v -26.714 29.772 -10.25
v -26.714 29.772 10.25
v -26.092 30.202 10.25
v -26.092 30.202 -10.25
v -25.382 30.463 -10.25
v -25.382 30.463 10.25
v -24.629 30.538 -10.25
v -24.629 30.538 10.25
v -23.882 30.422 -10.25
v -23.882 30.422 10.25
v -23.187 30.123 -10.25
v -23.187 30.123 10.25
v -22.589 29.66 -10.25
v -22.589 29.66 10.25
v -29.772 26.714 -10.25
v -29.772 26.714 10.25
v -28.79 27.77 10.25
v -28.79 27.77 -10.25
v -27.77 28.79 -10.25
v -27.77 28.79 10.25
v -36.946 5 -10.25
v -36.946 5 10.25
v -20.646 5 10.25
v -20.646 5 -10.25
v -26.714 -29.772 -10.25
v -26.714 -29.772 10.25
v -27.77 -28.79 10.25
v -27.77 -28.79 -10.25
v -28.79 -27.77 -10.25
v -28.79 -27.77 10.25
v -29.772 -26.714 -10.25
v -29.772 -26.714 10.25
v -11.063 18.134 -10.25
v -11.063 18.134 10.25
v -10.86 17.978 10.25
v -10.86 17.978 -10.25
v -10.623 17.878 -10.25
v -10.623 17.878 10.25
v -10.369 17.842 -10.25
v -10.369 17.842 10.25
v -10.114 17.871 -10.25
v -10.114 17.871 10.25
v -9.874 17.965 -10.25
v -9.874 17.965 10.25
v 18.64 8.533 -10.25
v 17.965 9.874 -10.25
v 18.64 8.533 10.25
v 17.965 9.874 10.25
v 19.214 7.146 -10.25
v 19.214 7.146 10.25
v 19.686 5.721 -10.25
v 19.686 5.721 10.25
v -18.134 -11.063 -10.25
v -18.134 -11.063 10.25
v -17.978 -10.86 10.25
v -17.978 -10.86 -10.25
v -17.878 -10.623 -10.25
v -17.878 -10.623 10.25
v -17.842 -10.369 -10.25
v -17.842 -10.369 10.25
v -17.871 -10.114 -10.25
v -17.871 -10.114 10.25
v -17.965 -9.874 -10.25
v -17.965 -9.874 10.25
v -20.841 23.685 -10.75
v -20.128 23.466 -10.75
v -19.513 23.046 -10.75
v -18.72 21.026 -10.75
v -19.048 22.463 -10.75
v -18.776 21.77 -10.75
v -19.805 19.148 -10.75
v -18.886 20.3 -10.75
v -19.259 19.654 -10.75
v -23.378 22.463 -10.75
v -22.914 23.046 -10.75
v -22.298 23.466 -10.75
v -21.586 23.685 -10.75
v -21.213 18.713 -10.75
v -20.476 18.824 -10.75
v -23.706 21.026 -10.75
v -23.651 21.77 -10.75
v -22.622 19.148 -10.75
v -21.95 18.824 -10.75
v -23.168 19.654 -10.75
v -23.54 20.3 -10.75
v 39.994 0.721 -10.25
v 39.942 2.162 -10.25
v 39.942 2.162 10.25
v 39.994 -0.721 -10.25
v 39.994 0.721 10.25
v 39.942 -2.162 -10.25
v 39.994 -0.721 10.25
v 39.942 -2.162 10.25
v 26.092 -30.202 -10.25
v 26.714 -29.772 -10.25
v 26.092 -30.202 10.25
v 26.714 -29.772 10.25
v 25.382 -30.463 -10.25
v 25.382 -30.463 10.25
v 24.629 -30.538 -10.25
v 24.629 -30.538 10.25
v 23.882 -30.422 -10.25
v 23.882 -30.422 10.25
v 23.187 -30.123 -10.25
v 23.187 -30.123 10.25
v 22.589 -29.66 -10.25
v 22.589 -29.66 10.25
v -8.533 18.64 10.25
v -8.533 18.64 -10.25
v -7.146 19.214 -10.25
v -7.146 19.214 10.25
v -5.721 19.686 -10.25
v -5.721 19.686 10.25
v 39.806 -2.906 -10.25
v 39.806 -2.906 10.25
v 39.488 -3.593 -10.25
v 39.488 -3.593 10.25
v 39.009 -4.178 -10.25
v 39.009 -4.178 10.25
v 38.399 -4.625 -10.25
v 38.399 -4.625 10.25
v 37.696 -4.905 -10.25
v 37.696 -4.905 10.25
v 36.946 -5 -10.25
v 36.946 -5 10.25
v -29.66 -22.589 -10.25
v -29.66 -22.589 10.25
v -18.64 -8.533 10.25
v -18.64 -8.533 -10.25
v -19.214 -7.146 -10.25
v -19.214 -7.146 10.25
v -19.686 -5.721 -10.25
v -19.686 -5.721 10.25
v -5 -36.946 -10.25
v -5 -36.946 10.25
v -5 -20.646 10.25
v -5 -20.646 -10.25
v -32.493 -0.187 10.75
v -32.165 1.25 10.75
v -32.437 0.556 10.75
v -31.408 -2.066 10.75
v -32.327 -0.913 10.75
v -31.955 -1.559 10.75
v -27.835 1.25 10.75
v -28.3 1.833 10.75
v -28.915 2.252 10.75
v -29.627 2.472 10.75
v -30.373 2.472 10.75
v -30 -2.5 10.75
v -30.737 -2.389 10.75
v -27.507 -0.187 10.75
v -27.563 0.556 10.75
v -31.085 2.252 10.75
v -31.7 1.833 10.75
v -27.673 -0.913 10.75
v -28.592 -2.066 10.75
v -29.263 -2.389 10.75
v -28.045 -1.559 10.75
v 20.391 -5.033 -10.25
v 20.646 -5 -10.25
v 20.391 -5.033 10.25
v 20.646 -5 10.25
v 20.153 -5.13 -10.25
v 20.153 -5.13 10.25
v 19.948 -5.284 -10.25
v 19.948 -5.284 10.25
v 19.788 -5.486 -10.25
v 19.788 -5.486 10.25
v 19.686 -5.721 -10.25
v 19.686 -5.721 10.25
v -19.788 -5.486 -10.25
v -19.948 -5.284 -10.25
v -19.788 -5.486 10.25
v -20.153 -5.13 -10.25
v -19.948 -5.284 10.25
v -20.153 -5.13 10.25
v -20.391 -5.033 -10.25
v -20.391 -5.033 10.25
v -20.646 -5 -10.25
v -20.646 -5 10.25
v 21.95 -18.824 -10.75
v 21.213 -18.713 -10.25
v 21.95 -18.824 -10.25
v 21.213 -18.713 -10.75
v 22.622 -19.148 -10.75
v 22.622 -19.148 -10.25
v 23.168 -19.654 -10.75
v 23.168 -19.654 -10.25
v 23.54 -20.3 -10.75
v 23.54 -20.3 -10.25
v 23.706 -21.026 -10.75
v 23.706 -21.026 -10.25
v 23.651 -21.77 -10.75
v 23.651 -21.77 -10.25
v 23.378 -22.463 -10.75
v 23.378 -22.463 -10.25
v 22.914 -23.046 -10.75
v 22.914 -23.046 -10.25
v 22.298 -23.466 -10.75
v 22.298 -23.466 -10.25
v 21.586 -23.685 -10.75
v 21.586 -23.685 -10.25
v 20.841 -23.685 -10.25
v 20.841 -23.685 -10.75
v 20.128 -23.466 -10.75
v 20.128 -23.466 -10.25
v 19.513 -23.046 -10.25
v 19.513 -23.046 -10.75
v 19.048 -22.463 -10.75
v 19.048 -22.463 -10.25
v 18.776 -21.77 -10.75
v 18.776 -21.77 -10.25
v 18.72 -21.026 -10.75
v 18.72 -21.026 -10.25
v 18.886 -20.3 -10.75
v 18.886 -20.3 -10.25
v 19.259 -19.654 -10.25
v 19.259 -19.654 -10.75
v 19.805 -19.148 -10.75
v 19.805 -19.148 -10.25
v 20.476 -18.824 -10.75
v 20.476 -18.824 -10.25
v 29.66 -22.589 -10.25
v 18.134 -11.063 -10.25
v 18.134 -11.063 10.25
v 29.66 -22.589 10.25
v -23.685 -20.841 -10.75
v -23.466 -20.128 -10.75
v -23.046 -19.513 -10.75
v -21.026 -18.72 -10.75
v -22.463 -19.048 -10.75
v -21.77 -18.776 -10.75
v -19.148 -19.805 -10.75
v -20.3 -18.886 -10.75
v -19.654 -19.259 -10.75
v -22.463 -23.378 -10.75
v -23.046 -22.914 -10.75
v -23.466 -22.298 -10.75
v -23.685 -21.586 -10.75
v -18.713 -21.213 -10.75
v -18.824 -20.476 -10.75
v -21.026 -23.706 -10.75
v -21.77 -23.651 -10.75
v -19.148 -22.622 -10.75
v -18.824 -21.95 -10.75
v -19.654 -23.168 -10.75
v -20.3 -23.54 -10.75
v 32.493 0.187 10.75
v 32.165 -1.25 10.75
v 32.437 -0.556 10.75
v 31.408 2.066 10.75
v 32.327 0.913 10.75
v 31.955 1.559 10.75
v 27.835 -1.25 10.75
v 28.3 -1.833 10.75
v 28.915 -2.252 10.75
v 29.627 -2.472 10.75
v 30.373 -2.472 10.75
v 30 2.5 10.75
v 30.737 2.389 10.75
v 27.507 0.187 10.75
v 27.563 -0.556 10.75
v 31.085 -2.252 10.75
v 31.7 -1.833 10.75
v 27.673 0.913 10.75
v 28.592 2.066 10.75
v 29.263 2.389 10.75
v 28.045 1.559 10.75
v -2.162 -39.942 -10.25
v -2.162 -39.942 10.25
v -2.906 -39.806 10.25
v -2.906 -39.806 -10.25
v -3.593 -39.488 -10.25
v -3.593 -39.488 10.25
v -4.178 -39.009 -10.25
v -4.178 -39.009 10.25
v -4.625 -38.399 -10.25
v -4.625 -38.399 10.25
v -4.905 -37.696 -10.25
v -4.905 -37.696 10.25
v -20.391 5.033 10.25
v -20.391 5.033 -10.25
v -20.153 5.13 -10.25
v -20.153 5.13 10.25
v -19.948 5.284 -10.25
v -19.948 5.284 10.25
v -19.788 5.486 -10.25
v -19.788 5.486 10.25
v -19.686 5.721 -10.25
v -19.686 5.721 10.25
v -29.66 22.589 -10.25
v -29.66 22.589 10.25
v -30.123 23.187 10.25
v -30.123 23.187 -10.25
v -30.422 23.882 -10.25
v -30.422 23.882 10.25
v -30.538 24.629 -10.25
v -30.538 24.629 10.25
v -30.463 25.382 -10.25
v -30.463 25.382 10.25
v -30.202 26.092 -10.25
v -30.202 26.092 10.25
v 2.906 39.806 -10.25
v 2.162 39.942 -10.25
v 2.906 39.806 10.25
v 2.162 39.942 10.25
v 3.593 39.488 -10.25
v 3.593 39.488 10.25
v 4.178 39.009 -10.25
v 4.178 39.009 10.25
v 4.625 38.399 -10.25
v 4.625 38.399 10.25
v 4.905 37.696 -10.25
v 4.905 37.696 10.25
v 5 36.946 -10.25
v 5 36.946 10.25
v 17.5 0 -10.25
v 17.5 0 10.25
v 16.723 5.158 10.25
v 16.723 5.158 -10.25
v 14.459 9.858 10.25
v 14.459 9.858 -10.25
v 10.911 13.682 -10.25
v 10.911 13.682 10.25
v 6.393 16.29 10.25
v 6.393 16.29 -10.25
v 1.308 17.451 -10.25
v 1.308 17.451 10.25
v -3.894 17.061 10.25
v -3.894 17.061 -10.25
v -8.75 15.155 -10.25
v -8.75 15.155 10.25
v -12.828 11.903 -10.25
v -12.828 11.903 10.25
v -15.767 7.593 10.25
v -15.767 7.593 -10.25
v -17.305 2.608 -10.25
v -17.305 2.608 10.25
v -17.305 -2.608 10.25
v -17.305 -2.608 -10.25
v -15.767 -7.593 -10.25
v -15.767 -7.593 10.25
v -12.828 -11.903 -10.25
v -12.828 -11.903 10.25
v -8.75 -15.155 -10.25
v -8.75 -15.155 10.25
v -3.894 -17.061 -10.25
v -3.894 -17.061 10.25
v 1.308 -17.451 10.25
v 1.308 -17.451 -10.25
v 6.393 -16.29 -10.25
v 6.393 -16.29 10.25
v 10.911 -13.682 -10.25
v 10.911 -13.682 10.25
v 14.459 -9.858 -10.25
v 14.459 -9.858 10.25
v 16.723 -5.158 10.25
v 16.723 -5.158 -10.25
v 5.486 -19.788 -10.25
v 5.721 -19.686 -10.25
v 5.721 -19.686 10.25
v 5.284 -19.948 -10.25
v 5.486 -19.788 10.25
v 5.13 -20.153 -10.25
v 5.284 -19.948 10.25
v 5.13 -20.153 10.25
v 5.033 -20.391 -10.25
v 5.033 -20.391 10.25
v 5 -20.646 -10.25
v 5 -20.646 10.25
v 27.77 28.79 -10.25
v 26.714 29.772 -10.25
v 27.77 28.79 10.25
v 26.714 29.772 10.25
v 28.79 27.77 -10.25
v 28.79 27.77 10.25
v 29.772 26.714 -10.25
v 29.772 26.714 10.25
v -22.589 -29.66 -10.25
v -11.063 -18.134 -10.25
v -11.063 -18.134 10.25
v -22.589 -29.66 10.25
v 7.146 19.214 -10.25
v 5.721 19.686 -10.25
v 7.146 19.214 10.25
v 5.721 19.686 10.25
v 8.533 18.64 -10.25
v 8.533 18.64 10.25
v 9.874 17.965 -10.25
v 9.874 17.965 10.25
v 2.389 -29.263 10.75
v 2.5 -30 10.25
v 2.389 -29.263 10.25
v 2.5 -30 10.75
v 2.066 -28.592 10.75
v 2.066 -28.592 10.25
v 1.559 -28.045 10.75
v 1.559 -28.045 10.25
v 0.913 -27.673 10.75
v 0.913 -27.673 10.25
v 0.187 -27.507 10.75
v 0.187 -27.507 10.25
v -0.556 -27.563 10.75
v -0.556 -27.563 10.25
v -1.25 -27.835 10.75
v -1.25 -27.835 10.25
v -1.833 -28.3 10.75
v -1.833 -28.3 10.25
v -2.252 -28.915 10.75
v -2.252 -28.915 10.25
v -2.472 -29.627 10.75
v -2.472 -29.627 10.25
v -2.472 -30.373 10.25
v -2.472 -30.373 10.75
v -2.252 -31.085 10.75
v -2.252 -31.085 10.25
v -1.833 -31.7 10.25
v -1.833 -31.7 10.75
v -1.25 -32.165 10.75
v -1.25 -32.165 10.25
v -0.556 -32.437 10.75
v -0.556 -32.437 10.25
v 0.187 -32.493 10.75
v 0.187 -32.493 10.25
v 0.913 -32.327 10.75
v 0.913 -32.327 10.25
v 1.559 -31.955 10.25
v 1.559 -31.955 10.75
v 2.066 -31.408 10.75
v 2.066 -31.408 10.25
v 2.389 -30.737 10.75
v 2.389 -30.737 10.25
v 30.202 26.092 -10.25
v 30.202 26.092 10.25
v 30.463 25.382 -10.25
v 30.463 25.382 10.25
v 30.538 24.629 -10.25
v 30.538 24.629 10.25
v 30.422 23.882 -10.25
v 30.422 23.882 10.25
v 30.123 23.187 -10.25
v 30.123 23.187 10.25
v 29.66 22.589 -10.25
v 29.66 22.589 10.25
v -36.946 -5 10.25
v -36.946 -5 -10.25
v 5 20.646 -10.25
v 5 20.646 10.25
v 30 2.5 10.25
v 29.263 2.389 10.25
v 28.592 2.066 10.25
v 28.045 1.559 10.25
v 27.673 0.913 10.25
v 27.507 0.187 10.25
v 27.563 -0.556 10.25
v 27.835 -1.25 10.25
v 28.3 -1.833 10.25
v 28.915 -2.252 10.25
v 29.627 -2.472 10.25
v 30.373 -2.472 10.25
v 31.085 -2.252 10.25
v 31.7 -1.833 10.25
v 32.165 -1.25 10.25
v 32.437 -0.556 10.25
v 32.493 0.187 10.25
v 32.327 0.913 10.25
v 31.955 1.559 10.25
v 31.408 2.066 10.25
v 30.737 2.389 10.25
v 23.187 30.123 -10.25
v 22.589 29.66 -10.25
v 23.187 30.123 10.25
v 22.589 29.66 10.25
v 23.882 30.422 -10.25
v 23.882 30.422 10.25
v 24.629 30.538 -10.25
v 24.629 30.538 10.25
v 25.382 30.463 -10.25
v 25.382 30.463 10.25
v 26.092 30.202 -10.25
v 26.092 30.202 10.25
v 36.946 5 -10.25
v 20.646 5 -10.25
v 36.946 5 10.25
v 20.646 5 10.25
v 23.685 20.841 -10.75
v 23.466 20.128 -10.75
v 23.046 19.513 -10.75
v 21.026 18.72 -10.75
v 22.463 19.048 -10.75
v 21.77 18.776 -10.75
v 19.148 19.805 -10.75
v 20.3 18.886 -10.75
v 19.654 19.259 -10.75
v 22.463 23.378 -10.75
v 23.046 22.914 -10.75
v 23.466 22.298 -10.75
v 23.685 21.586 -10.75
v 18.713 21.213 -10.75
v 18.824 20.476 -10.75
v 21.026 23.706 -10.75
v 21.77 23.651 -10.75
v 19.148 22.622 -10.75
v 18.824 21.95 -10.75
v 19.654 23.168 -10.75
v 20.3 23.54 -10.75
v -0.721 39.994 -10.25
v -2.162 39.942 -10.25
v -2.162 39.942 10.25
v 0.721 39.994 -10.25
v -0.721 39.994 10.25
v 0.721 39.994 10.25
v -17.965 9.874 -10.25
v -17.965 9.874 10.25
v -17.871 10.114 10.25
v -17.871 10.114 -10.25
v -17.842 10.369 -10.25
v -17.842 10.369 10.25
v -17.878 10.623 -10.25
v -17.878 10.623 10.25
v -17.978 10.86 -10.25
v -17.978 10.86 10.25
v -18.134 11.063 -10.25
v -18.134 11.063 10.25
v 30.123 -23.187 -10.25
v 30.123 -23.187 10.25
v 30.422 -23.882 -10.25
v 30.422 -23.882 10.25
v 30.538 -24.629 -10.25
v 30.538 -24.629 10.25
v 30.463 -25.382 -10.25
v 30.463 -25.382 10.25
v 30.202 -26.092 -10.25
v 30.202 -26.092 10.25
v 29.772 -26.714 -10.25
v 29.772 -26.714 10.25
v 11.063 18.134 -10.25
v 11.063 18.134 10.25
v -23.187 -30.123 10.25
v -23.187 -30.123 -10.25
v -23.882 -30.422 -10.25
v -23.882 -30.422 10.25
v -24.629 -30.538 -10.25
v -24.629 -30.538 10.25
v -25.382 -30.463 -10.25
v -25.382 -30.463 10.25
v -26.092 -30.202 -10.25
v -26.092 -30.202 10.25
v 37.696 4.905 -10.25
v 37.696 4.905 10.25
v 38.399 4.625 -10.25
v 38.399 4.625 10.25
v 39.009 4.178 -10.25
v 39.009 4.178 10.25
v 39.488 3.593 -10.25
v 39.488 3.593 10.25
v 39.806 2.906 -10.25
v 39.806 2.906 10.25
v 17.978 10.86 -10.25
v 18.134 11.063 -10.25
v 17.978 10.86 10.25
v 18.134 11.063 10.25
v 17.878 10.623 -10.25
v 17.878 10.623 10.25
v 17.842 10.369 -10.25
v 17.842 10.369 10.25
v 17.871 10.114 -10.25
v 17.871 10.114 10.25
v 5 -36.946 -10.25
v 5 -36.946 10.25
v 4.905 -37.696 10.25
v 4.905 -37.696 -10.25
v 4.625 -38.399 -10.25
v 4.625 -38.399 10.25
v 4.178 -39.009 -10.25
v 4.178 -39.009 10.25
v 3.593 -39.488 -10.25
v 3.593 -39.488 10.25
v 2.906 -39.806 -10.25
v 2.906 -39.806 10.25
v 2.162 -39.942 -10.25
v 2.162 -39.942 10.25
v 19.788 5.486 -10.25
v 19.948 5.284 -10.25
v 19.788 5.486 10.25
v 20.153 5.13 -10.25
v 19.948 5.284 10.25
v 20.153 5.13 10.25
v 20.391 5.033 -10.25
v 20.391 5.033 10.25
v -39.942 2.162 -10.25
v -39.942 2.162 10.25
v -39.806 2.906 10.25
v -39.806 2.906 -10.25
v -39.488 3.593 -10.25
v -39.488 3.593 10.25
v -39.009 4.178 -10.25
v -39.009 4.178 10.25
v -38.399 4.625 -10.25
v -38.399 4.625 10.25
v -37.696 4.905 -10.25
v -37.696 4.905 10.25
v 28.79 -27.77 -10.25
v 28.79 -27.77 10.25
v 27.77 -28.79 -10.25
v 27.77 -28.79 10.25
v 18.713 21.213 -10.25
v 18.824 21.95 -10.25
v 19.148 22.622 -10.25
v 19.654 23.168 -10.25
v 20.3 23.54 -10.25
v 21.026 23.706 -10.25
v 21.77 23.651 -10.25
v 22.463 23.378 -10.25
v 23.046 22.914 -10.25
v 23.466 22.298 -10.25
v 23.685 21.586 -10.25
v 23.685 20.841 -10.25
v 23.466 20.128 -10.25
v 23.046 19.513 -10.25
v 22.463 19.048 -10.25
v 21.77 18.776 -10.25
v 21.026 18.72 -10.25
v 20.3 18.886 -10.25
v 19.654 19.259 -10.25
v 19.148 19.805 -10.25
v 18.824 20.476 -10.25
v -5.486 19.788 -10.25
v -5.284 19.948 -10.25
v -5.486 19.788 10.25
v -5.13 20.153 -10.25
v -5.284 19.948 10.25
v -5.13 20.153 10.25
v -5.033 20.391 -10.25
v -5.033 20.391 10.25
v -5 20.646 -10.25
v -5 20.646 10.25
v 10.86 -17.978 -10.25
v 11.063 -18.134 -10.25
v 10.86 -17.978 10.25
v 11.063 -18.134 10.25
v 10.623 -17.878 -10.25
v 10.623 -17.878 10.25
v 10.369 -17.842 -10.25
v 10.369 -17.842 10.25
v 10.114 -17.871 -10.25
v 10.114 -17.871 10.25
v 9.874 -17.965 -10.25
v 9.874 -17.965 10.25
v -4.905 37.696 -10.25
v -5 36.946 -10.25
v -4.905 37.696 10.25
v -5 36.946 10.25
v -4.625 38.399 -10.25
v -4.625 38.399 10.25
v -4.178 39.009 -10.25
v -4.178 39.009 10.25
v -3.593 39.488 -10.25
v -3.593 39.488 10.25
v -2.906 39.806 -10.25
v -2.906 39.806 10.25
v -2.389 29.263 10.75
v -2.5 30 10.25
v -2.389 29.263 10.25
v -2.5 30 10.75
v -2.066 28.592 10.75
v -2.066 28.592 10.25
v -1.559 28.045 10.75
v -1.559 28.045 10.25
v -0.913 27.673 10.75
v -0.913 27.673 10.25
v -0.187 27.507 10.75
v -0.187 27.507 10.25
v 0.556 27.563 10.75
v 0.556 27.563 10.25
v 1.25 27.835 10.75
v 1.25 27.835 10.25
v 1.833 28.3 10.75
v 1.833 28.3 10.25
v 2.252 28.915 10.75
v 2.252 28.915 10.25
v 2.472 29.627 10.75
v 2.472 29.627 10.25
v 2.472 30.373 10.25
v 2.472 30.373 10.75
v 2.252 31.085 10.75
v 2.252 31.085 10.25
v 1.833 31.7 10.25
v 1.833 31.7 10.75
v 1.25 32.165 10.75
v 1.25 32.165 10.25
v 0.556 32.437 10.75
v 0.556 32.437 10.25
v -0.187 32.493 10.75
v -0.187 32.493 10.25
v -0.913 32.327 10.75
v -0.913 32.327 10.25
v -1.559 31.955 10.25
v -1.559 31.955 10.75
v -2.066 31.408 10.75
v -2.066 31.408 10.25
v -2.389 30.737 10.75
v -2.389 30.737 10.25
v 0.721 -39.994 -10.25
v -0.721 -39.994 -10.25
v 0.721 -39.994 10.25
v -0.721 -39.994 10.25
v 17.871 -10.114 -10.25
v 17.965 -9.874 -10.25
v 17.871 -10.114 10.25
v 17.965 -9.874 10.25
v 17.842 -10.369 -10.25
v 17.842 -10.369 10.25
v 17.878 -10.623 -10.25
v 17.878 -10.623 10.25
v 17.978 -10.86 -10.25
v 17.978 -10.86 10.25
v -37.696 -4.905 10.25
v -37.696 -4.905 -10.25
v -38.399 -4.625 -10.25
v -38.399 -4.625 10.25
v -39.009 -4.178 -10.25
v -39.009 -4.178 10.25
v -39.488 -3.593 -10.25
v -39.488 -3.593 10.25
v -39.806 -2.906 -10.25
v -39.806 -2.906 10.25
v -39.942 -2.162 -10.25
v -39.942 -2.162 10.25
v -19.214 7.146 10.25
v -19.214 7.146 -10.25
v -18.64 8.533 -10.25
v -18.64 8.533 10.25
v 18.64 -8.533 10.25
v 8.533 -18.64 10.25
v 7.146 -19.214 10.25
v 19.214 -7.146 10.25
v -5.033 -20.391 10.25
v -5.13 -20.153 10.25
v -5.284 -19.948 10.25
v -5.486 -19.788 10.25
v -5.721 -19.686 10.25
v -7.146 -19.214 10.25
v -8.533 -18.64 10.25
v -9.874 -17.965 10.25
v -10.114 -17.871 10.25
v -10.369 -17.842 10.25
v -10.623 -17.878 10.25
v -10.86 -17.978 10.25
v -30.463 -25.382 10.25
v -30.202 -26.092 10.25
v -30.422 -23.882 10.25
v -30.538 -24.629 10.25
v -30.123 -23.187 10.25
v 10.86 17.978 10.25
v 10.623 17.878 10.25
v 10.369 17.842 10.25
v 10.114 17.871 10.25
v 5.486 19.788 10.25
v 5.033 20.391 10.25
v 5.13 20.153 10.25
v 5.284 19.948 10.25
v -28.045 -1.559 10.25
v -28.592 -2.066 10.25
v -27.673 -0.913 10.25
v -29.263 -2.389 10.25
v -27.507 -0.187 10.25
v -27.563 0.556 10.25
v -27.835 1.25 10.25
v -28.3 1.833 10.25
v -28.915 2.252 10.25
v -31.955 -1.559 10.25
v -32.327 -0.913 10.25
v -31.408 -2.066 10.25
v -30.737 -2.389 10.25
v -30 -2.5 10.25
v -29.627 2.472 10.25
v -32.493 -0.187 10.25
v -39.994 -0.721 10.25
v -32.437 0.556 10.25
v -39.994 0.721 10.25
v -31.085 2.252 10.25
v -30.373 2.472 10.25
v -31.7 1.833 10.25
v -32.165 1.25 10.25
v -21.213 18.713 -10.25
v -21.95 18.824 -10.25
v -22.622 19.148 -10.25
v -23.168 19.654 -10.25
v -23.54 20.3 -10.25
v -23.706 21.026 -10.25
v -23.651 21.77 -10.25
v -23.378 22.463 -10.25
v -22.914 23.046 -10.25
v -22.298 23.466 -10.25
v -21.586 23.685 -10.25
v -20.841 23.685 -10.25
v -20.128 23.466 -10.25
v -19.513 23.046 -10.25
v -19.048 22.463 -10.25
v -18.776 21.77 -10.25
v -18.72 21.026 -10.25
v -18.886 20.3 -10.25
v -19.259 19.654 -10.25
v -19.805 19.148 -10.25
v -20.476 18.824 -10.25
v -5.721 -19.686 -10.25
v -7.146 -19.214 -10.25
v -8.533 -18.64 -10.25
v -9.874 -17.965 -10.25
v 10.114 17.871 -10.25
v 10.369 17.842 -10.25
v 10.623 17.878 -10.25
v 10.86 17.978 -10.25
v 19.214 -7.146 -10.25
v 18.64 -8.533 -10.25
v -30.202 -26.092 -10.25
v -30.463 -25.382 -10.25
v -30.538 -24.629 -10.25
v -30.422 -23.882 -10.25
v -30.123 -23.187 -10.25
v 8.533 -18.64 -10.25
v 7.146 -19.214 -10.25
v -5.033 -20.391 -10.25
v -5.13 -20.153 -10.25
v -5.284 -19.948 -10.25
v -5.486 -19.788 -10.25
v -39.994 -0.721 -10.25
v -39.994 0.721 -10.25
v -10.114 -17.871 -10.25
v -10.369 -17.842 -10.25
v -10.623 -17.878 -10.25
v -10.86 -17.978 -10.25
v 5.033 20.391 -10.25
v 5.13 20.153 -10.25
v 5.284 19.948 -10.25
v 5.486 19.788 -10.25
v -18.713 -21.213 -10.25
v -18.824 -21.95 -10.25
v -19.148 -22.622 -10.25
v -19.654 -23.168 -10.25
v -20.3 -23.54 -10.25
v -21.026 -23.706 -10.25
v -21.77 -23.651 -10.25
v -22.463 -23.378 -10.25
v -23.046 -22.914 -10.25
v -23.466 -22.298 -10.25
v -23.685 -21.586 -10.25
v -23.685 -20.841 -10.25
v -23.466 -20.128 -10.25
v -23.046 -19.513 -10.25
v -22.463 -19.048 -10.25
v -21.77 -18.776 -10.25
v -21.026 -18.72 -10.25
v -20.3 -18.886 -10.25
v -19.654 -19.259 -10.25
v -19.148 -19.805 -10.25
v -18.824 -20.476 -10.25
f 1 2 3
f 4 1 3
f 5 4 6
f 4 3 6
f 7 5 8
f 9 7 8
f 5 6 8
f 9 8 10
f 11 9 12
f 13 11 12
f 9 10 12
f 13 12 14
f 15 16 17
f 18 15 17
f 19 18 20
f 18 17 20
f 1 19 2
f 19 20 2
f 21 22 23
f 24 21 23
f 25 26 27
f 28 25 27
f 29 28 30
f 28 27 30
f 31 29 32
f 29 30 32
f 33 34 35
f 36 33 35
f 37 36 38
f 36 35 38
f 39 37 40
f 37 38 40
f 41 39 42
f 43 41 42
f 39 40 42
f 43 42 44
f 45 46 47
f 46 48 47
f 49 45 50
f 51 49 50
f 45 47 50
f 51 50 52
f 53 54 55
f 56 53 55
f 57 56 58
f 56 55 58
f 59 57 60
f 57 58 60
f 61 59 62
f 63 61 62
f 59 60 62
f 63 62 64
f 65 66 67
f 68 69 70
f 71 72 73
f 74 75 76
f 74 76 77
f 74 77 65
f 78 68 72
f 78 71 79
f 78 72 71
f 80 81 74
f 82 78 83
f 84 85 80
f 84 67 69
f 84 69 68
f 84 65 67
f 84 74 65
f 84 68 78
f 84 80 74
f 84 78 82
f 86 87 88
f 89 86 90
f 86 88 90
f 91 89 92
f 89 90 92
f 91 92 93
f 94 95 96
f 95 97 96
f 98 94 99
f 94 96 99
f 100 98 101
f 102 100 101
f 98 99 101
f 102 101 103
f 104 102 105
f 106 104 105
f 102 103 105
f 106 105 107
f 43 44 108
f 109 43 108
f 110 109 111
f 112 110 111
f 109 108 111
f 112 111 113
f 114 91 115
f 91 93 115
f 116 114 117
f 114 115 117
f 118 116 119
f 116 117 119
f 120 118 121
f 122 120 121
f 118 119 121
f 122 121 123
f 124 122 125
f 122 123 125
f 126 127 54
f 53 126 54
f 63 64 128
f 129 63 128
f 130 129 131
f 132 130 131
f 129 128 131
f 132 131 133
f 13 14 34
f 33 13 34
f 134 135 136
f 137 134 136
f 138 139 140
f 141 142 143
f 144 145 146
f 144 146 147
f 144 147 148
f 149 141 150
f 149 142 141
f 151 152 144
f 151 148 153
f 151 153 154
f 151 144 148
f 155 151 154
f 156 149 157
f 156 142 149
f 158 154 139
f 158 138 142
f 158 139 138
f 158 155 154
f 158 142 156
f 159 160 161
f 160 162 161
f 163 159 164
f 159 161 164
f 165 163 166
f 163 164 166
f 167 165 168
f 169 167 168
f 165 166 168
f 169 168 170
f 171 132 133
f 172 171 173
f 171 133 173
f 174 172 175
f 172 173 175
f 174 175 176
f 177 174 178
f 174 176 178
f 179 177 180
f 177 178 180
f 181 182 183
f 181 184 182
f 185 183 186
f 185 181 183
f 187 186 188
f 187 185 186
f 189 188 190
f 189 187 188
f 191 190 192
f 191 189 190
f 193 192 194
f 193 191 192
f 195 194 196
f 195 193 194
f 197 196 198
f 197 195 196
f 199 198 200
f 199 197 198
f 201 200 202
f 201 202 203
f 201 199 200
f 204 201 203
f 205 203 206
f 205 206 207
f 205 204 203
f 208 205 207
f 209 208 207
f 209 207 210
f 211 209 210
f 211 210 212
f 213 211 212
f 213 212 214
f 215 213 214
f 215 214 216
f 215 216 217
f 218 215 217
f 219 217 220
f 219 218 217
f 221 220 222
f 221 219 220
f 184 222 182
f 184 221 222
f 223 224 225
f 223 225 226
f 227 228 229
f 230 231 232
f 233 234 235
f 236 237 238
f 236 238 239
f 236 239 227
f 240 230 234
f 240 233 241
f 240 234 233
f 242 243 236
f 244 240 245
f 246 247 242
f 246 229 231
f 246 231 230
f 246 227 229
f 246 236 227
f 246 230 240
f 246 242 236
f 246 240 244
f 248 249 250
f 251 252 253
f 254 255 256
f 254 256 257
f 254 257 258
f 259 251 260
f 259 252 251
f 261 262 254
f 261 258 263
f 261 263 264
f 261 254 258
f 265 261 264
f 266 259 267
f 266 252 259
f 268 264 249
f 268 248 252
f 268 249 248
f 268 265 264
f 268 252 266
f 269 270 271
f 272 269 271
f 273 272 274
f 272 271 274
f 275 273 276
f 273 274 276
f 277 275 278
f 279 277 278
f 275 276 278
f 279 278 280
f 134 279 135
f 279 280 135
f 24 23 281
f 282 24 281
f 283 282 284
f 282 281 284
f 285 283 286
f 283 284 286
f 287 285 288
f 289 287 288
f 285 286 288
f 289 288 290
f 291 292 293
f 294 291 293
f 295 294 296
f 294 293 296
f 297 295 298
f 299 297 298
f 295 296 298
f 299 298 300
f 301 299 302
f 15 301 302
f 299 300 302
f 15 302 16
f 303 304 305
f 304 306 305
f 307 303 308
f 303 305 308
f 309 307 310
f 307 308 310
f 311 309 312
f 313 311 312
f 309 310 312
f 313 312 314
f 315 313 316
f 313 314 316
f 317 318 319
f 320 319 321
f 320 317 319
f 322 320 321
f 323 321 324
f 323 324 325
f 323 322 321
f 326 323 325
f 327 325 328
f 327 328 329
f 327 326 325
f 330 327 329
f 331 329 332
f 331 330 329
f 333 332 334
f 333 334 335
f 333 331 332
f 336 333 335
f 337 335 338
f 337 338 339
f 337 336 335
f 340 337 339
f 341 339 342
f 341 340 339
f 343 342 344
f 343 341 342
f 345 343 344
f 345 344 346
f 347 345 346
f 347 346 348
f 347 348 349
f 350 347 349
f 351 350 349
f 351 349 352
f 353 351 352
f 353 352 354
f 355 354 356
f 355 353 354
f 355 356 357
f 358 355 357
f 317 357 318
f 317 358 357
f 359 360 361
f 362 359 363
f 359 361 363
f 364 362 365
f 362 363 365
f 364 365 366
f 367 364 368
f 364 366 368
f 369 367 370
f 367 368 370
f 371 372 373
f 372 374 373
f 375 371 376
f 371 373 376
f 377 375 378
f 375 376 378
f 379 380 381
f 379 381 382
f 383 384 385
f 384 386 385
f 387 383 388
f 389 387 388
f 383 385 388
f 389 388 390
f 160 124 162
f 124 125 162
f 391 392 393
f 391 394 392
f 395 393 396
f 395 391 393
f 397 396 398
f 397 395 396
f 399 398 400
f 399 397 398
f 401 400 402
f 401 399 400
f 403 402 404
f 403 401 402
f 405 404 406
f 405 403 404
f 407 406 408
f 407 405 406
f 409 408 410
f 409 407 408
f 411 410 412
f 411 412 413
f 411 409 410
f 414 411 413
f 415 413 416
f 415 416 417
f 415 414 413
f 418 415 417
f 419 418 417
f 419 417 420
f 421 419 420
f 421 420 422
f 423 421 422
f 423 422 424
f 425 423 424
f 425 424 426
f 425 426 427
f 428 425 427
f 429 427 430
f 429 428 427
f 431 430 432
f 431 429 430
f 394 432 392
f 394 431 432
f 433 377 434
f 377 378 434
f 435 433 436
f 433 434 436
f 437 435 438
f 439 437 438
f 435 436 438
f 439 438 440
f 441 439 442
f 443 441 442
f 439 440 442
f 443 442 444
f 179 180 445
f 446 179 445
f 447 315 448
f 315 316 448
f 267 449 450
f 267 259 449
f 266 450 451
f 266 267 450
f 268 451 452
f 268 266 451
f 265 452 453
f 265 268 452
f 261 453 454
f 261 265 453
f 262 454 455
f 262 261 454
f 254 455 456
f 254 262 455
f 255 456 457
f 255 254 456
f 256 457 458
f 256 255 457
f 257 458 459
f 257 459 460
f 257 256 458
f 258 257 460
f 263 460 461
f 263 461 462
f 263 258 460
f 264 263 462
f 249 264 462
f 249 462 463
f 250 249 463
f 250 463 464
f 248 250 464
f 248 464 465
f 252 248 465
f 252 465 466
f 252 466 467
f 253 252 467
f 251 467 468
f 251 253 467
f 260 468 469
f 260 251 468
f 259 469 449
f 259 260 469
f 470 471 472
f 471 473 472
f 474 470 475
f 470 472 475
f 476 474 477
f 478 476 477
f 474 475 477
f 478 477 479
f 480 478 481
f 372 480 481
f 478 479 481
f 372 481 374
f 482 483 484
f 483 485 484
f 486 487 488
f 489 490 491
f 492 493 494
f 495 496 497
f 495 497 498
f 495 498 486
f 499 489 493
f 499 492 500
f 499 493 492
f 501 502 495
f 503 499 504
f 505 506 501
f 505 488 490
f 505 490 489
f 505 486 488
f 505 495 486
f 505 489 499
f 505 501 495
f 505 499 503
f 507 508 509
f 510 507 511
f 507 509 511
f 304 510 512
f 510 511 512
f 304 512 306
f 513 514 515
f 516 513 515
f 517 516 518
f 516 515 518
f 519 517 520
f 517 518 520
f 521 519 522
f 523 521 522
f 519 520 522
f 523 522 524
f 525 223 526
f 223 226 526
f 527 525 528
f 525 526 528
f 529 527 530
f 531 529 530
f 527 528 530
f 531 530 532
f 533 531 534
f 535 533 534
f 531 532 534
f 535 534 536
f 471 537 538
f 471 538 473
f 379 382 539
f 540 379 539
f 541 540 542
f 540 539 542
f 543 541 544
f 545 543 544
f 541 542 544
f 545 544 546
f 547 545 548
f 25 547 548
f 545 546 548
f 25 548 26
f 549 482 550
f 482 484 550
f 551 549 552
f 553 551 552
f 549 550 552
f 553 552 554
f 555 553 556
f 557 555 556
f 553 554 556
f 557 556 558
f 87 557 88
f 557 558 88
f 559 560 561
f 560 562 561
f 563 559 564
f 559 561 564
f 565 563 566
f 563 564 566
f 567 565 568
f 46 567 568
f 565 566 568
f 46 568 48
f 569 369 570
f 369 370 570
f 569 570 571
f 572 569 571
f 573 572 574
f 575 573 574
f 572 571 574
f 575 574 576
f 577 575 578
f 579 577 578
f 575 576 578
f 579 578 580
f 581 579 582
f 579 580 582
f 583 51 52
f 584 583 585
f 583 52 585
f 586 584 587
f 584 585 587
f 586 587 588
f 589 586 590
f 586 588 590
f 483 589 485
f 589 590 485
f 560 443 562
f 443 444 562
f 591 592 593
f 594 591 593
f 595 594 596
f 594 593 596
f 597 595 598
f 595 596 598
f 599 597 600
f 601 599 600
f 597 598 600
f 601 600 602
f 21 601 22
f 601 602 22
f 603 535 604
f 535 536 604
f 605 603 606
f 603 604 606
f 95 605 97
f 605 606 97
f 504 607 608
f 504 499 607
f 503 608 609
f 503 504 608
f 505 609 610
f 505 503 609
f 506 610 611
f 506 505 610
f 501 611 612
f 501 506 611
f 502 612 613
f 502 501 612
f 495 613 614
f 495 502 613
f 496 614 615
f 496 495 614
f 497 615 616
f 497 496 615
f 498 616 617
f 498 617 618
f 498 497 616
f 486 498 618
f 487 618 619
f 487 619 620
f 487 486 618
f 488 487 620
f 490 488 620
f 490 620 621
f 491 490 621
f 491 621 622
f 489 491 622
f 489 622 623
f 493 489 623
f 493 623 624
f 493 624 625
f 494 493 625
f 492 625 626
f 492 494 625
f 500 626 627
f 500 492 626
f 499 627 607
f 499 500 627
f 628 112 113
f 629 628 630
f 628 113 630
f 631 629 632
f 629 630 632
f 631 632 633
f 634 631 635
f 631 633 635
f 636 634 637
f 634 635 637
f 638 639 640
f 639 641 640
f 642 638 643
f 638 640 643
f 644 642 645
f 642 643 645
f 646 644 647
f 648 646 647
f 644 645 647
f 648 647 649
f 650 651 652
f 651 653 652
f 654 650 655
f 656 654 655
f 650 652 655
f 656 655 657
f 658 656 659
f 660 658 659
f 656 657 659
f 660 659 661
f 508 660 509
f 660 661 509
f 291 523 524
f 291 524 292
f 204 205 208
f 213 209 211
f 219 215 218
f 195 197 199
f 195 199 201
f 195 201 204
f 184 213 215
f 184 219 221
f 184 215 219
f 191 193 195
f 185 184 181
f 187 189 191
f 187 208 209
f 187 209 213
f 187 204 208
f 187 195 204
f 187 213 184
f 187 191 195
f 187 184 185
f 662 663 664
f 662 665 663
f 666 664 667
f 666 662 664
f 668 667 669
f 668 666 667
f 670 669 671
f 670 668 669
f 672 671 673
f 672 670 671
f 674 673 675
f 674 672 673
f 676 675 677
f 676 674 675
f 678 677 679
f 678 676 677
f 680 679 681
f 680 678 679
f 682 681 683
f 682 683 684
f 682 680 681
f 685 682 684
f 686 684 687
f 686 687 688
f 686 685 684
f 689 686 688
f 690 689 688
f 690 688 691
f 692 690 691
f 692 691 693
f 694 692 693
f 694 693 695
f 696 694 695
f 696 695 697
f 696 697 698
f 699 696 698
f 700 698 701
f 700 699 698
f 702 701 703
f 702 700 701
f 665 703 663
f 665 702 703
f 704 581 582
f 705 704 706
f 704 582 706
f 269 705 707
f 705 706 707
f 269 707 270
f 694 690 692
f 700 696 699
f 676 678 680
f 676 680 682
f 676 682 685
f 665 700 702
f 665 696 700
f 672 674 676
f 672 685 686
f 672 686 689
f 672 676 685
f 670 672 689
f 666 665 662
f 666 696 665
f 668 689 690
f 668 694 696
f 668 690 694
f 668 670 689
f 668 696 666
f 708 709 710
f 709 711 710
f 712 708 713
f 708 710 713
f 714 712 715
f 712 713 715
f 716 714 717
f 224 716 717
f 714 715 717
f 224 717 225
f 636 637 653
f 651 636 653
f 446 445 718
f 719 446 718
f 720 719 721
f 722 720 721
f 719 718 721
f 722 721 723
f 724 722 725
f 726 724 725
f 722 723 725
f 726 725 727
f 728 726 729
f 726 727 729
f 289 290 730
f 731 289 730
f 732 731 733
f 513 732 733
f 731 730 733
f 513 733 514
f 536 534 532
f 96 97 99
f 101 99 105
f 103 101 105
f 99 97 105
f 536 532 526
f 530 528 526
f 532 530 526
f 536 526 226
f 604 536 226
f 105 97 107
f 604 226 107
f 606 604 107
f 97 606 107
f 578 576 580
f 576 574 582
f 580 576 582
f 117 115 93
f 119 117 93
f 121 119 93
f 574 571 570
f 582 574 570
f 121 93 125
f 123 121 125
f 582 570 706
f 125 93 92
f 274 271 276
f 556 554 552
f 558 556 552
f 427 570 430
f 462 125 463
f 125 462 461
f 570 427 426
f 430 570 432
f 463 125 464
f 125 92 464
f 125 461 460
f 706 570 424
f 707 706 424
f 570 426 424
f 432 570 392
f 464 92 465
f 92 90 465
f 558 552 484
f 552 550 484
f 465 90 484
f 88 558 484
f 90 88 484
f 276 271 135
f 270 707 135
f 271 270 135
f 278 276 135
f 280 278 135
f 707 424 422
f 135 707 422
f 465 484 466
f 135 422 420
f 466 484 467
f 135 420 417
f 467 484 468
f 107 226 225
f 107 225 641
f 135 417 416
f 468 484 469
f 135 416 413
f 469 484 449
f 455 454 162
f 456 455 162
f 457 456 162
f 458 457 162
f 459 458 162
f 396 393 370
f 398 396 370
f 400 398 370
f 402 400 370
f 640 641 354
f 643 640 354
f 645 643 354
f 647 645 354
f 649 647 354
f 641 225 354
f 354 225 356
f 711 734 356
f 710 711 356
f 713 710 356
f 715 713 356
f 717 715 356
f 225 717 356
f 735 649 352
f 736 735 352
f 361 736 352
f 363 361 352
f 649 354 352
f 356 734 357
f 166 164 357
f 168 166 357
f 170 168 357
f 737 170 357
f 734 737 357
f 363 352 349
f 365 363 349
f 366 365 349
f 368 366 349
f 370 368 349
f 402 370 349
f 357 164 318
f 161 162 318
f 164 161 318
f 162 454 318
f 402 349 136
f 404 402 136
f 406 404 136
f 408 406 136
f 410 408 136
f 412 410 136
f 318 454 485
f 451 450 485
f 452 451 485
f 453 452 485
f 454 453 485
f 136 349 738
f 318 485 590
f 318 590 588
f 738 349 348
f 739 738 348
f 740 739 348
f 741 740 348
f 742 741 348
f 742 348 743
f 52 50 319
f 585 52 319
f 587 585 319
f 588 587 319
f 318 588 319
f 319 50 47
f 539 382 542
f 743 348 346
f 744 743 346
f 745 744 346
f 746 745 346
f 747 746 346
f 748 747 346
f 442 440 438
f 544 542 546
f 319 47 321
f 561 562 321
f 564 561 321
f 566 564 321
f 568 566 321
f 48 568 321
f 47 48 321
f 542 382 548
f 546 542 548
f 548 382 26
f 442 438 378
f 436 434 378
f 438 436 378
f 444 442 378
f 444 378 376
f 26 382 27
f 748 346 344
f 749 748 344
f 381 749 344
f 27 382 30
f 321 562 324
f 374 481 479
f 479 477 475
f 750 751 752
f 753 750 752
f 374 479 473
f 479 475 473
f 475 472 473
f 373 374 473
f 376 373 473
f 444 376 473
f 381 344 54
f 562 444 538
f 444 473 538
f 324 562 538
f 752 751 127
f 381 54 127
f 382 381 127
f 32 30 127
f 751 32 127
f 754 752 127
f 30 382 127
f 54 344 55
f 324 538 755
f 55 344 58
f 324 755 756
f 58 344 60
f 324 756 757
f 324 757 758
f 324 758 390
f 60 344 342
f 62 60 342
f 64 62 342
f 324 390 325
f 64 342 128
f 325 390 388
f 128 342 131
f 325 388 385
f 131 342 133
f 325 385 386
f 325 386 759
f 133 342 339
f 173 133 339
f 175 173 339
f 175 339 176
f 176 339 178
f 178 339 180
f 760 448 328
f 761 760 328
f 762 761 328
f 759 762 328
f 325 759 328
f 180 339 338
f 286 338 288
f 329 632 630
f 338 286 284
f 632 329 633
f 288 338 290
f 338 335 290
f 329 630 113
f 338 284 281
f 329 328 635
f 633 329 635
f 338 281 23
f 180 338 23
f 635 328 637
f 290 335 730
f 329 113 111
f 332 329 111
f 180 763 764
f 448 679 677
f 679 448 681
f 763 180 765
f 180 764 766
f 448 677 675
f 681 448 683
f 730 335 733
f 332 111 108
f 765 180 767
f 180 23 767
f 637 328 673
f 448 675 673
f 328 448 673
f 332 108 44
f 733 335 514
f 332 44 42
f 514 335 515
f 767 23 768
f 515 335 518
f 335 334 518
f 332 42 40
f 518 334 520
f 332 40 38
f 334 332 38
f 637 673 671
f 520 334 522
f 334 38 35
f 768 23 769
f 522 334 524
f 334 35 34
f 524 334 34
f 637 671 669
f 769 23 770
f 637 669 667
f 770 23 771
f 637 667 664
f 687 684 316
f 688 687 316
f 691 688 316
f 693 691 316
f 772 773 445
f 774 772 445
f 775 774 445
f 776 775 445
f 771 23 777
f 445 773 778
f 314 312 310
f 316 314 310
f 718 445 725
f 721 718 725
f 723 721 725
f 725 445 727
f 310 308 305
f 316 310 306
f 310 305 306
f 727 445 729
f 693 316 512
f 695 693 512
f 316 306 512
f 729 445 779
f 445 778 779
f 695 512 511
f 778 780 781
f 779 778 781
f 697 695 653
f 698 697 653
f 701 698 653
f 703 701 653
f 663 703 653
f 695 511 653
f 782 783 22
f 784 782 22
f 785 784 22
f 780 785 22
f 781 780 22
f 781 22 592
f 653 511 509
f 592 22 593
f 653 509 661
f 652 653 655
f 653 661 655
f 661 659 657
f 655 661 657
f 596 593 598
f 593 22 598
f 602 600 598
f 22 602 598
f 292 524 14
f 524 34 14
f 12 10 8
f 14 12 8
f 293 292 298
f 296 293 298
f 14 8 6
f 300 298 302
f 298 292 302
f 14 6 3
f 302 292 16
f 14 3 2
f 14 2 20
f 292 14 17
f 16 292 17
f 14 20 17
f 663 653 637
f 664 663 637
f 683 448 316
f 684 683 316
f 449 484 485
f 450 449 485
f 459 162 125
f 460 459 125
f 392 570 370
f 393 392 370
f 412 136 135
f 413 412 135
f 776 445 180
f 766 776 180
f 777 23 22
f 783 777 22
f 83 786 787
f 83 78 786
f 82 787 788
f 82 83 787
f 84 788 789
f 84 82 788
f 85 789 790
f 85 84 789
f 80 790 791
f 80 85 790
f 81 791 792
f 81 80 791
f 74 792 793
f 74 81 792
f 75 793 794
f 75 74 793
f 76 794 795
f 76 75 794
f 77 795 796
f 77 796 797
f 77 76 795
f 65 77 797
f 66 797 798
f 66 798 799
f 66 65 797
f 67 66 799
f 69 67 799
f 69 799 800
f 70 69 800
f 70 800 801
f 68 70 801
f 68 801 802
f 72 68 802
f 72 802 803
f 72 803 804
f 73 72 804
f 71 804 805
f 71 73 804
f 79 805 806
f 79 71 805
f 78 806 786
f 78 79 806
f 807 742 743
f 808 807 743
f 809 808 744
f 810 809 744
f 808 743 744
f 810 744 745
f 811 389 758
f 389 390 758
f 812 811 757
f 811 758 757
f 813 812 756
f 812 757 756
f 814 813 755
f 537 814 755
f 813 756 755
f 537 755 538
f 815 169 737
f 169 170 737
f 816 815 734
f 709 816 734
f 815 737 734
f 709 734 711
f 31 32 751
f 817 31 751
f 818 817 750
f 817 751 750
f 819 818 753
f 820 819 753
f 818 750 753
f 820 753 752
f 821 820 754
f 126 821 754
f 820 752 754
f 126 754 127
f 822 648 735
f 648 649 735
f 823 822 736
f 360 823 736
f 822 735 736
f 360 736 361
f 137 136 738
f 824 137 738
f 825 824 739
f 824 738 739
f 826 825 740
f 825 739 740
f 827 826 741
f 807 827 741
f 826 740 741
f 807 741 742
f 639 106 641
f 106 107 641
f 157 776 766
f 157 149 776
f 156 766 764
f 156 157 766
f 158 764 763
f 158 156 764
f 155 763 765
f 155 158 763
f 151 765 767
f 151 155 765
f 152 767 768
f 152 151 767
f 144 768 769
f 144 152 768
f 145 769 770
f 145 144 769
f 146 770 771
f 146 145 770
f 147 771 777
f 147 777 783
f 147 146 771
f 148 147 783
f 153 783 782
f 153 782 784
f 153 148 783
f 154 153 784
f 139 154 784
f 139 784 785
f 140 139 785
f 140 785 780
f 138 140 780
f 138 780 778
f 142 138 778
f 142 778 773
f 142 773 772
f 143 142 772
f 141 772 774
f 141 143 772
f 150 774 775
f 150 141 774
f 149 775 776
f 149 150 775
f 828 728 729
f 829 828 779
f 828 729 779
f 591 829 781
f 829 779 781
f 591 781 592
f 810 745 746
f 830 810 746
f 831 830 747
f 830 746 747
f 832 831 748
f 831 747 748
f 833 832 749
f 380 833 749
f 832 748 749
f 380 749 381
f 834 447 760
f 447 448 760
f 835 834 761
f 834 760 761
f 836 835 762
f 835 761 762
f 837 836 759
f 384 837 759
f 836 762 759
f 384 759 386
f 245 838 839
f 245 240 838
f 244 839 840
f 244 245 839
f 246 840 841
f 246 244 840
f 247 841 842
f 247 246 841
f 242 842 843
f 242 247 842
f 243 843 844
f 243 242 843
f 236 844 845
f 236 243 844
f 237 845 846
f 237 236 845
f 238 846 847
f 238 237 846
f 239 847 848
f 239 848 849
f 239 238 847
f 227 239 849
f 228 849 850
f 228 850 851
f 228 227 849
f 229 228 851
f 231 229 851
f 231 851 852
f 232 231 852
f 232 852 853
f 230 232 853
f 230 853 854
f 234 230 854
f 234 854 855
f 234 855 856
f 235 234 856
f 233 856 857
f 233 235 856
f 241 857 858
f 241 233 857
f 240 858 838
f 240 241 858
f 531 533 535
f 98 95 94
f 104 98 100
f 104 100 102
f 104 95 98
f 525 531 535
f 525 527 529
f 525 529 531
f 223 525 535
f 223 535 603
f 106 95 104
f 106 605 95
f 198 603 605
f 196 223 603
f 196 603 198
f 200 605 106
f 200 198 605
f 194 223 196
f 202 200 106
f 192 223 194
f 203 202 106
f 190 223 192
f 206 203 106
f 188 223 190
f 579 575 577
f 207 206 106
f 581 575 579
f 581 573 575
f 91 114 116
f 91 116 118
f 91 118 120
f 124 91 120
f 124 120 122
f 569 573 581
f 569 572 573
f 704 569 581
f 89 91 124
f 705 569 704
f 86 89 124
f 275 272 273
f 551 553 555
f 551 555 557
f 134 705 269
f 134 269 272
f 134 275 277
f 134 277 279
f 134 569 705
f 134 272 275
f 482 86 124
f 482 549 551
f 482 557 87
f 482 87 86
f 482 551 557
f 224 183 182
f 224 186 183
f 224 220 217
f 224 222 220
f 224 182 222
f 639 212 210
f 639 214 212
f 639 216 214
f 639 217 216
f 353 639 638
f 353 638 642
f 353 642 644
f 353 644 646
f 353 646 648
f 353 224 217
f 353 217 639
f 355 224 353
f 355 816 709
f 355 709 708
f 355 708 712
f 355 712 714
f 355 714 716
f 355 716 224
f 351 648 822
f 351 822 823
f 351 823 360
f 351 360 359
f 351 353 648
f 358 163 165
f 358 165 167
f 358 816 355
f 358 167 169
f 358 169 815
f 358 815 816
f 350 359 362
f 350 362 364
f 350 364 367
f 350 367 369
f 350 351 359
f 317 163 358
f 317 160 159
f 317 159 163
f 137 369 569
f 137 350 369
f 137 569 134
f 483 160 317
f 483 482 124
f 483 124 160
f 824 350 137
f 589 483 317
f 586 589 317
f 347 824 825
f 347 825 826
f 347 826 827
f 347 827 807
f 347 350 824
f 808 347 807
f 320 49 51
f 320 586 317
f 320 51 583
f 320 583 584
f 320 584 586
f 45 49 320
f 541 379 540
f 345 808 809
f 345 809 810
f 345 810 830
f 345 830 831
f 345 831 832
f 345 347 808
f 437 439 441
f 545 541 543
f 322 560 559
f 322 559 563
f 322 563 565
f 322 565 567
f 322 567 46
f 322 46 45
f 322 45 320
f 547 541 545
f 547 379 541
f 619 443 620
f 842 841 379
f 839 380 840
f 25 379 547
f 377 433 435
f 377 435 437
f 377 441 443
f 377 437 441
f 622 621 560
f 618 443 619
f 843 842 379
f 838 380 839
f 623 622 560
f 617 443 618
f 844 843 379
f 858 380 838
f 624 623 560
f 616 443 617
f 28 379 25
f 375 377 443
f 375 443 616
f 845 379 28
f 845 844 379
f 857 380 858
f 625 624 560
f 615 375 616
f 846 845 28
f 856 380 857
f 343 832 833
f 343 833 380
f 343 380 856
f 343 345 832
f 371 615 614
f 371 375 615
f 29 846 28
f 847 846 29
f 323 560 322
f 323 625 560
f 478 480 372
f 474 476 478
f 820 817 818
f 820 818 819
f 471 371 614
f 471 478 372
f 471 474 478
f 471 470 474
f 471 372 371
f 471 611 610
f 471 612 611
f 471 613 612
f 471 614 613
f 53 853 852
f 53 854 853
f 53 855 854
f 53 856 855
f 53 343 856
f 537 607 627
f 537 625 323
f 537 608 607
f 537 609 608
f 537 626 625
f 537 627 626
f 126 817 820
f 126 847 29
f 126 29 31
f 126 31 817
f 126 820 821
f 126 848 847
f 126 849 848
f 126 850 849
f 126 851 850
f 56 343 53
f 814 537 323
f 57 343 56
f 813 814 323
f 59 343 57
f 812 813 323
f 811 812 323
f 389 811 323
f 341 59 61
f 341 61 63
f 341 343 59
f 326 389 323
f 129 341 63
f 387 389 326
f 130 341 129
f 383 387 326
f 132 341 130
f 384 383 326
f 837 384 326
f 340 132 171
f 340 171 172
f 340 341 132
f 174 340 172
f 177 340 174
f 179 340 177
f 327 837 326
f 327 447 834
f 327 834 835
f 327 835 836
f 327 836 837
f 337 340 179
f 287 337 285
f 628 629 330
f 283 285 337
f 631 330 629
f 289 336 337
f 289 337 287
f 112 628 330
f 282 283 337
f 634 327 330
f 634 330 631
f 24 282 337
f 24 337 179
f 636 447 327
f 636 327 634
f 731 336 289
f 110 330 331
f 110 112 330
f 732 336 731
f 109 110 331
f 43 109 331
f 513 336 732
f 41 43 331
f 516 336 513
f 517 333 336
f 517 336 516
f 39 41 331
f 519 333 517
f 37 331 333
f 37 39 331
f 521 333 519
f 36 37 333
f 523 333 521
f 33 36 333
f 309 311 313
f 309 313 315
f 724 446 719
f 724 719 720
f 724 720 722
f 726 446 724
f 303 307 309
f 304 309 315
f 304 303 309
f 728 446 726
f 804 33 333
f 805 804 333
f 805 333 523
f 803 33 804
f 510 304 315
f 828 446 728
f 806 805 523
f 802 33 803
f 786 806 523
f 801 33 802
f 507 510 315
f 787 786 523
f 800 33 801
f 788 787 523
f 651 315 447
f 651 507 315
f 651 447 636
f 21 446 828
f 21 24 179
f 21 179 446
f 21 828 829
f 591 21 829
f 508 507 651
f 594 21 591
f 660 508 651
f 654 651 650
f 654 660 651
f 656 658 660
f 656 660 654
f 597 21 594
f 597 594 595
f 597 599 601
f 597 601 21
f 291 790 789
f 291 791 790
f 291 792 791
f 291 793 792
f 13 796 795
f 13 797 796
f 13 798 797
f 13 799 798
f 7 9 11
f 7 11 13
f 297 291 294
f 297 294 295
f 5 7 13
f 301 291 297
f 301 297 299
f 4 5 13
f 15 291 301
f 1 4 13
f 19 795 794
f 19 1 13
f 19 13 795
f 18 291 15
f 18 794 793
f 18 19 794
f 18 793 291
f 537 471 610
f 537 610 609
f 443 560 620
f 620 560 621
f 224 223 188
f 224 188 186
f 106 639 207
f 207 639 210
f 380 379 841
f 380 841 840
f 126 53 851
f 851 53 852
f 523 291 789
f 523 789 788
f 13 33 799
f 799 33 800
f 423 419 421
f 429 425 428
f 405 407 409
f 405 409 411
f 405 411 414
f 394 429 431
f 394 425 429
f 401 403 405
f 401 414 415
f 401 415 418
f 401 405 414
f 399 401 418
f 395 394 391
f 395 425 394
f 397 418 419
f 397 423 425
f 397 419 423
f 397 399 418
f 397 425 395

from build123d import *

# Parameters (mm, degrees)
SKETCH1_R           = 17.5
BOSS_EXTRUDE1_DEPTH = 10.25
SKETCH2_R           = 2.5
BOSS_EXTRUDE2_DEPTH = 0.5
SKETCH3_R           = 2.5
BOSS_EXTRUDE3_DEPTH = 0.5
CIRPATTERN1_COUNT   = 4


with BuildPart() as part:
    # Sketch1 → Boss-Extrude1 (new, symmetric)
    with BuildSketch(Plane.XY):
        with BuildLine():
            Line((-5, 20.645822822), (-5, 36.945906404))
            ThreePointArc((-5, 36.945906404), (-4.177898814, 39.00909732), (-2.162162162, 39.941520437))
            ThreePointArc((-2.162162162, 39.941520437), (0, 40), (2.162162162, 39.941520437))
            ThreePointArc((2.162162162, 39.941520437), (4.177898814, 39.00909732), (5, 36.945906404))
            Line((5, 36.945906404), (5, 20.645822822))
            ThreePointArc((5, 20.645822822), (5.200290751, 20.04543535), (5.720930233, 19.685551993))
            ThreePointArc((5.720930233, 19.685551993), (7.845010363, 18.939530416), (9.874478744, 17.965095868))
            ThreePointArc((9.874478744, 17.965095868), (10.497102414, 17.851424122), (11.063267415, 18.134335227))
            Line((11.063267415, 18.134335227), (22.589167049, 29.660234861))
            ThreePointArc((22.589167049, 29.660234861), (24.629376661, 30.537817825), (26.714040425, 29.771799478))
            ThreePointArc((26.714040425, 29.771799478), (28.284271247, 28.284271247), (29.771799478, 26.714040425))
            ThreePointArc((29.771799478, 26.714040425), (30.537817825, 24.629376661), (29.660234861, 22.589167049))
            Line((29.660234861, 22.589167049), (18.134335227, 11.063267415))
            ThreePointArc((18.134335227, 11.063267415), (17.851424122, 10.497102414), (17.965095868, 9.874478744))
            ThreePointArc((17.965095868, 9.874478744), (18.939530416, 7.845010363), (19.685551993, 5.720930233))
            ThreePointArc((19.685551993, 5.720930233), (20.04543535, 5.200290751), (20.645822822, 5))
            Line((20.645822822, 5), (36.945906404, 5))
            ThreePointArc((36.945906404, 5), (39.00909732, 4.177898814), (39.941520437, 2.162162162))
            ThreePointArc((39.941520437, 2.162162162), (40, 0), (39.941520437, -2.162162162))
            ThreePointArc((39.941520437, -2.162162162), (39.00909732, -4.177898814), (36.945906404, -5))
            Line((36.945906404, -5), (20.645822822, -5))
            ThreePointArc((20.645822822, -5), (20.04543535, -5.200290751), (19.685551993, -5.720930233))
            ThreePointArc((19.685551993, -5.720930233), (18.939530416, -7.845010363), (17.965095868, -9.874478744))
            ThreePointArc((17.965095868, -9.874478744), (17.851424122, -10.497102414), (18.134335227, -11.063267415))
            Line((18.134335227, -11.063267415), (29.660234861, -22.589167049))
            ThreePointArc((29.660234861, -22.589167049), (30.537817825, -24.629376661), (29.771799478, -26.714040425))
            ThreePointArc((29.771799478, -26.714040425), (28.284271247, -28.284271247), (26.714040425, -29.771799478))
            ThreePointArc((26.714040425, -29.771799478), (24.629376661, -30.537817825), (22.589167049, -29.660234861))
            Line((22.589167049, -29.660234861), (11.063267415, -18.134335227))
            ThreePointArc((11.063267415, -18.134335227), (10.497102414, -17.851424122), (9.874478744, -17.965095868))
            ThreePointArc((9.874478744, -17.965095868), (7.845010363, -18.939530416), (5.720930233, -19.685551993))
            ThreePointArc((5.720930233, -19.685551993), (5.200290751, -20.04543535), (5, -20.645822822))
            Line((5, -20.645822822), (5, -36.945906404))
            ThreePointArc((5, -36.945906404), (4.177898814, -39.00909732), (2.162162162, -39.941520437))
            ThreePointArc((2.162162162, -39.941520437), (0, -40), (-2.162162162, -39.941520437))
            ThreePointArc((-2.162162162, -39.941520437), (-4.177898814, -39.00909732), (-5, -36.945906404))
            Line((-5, -36.945906404), (-5, -20.645822822))
            ThreePointArc((-5, -20.645822822), (-5.200290751, -20.04543535), (-5.720930233, -19.685551993))
            ThreePointArc((-5.720930233, -19.685551993), (-7.845010363, -18.939530416), (-9.874478744, -17.965095868))
            ThreePointArc((-9.874478744, -17.965095868), (-10.497102414, -17.851424122), (-11.063267415, -18.134335227))
            Line((-11.063267415, -18.134335227), (-22.589167049, -29.660234861))
            ThreePointArc((-22.589167049, -29.660234861), (-24.629376661, -30.537817825), (-26.714040425, -29.771799478))
            ThreePointArc((-26.714040425, -29.771799478), (-28.284271247, -28.284271247), (-29.771799478, -26.714040425))
            ThreePointArc((-29.771799478, -26.714040425), (-30.537817825, -24.629376661), (-29.660234861, -22.589167049))
            Line((-29.660234861, -22.589167049), (-18.134335227, -11.063267415))
            ThreePointArc((-18.134335227, -11.063267415), (-17.851424122, -10.497102414), (-17.965095868, -9.874478744))
            ThreePointArc((-17.965095868, -9.874478744), (-18.939530416, -7.845010363), (-19.685551993, -5.720930233))
            ThreePointArc((-19.685551993, -5.720930233), (-20.04543535, -5.200290751), (-20.645822822, -5))
            Line((-20.645822822, -5), (-36.945906404, -5))
            ThreePointArc((-36.945906404, -5), (-39.00909732, -4.177898814), (-39.941520437, -2.162162162))
            ThreePointArc((-39.941520437, -2.162162162), (-40, 0), (-39.941520437, 2.162162162))
            ThreePointArc((-39.941520437, 2.162162162), (-39.00909732, 4.177898814), (-36.945906404, 5))
            Line((-36.945906404, 5), (-20.645822822, 5))
            ThreePointArc((-20.645822822, 5), (-20.04543535, 5.200290751), (-19.685551993, 5.720930233))
            ThreePointArc((-19.685551993, 5.720930233), (-18.939530416, 7.845010363), (-17.965095868, 9.874478744))
            ThreePointArc((-17.965095868, 9.874478744), (-17.851424122, 10.497102414), (-18.134335227, 11.063267415))
            Line((-18.134335227, 11.063267415), (-29.660234861, 22.589167049))
            ThreePointArc((-29.660234861, 22.589167049), (-30.537817825, 24.629376661), (-29.771799478, 26.714040425))
            ThreePointArc((-29.771799478, 26.714040425), (-28.284271247, 28.284271247), (-26.714040425, 29.771799478))
            ThreePointArc((-26.714040425, 29.771799478), (-24.629376661, 30.537817825), (-22.589167049, 29.660234861))
            Line((-22.589167049, 29.660234861), (-11.063267415, 18.134335227))
            ThreePointArc((-11.063267415, 18.134335227), (-10.497102414, 17.851424122), (-9.874478744, 17.965095868))
            ThreePointArc((-9.874478744, 17.965095868), (-7.845010363, 18.939530416), (-5.720930233, 19.685551993))
            ThreePointArc((-5.720930233, 19.685551993), (-5.200290751, 20.04543535), (-5, 20.645822822))
        make_face()
        Circle(SKETCH1_R, mode=Mode.SUBTRACT)
    extrude(amount=BOSS_EXTRUDE1_DEPTH, both=True)

    # Sketch2 → Boss-Extrude2 (add, symmetric)
    with BuildSketch(Plane.XY.offset(10.25)):
        with Locations(Location((0, 30, 0), (0, 0, 180))):
            Circle(SKETCH2_R)
    boss_extrude2 = extrude(amount=BOSS_EXTRUDE2_DEPTH, both=True)

    # Sketch3 → Boss-Extrude3 (add, symmetric)
    with BuildSketch(Plane(origin=(0, 0, -10.25), x_dir=(-1, 0, 0), z_dir=(0, 0, -1))):
        with Locations((-21.213203436, 21.213203436)):
            Circle(SKETCH3_R)
    boss_extrude3 = extrude(amount=BOSS_EXTRUDE3_DEPTH, both=True)

    # CirPattern1: Boss-Extrude2, Boss-Extrude3 ×4 about axis
    cirpattern1_axis = Axis((0, 0, 0), (0, 0, 1))
    add([boss_extrude2.rotate(cirpattern1_axis, i * 360 / CIRPATTERN1_COUNT) for i in range(1, CIRPATTERN1_COUNT)])
    add([boss_extrude3.rotate(cirpattern1_axis, i * 360 / CIRPATTERN1_COUNT) for i in range(1, CIRPATTERN1_COUNT)])


solid = part.part
